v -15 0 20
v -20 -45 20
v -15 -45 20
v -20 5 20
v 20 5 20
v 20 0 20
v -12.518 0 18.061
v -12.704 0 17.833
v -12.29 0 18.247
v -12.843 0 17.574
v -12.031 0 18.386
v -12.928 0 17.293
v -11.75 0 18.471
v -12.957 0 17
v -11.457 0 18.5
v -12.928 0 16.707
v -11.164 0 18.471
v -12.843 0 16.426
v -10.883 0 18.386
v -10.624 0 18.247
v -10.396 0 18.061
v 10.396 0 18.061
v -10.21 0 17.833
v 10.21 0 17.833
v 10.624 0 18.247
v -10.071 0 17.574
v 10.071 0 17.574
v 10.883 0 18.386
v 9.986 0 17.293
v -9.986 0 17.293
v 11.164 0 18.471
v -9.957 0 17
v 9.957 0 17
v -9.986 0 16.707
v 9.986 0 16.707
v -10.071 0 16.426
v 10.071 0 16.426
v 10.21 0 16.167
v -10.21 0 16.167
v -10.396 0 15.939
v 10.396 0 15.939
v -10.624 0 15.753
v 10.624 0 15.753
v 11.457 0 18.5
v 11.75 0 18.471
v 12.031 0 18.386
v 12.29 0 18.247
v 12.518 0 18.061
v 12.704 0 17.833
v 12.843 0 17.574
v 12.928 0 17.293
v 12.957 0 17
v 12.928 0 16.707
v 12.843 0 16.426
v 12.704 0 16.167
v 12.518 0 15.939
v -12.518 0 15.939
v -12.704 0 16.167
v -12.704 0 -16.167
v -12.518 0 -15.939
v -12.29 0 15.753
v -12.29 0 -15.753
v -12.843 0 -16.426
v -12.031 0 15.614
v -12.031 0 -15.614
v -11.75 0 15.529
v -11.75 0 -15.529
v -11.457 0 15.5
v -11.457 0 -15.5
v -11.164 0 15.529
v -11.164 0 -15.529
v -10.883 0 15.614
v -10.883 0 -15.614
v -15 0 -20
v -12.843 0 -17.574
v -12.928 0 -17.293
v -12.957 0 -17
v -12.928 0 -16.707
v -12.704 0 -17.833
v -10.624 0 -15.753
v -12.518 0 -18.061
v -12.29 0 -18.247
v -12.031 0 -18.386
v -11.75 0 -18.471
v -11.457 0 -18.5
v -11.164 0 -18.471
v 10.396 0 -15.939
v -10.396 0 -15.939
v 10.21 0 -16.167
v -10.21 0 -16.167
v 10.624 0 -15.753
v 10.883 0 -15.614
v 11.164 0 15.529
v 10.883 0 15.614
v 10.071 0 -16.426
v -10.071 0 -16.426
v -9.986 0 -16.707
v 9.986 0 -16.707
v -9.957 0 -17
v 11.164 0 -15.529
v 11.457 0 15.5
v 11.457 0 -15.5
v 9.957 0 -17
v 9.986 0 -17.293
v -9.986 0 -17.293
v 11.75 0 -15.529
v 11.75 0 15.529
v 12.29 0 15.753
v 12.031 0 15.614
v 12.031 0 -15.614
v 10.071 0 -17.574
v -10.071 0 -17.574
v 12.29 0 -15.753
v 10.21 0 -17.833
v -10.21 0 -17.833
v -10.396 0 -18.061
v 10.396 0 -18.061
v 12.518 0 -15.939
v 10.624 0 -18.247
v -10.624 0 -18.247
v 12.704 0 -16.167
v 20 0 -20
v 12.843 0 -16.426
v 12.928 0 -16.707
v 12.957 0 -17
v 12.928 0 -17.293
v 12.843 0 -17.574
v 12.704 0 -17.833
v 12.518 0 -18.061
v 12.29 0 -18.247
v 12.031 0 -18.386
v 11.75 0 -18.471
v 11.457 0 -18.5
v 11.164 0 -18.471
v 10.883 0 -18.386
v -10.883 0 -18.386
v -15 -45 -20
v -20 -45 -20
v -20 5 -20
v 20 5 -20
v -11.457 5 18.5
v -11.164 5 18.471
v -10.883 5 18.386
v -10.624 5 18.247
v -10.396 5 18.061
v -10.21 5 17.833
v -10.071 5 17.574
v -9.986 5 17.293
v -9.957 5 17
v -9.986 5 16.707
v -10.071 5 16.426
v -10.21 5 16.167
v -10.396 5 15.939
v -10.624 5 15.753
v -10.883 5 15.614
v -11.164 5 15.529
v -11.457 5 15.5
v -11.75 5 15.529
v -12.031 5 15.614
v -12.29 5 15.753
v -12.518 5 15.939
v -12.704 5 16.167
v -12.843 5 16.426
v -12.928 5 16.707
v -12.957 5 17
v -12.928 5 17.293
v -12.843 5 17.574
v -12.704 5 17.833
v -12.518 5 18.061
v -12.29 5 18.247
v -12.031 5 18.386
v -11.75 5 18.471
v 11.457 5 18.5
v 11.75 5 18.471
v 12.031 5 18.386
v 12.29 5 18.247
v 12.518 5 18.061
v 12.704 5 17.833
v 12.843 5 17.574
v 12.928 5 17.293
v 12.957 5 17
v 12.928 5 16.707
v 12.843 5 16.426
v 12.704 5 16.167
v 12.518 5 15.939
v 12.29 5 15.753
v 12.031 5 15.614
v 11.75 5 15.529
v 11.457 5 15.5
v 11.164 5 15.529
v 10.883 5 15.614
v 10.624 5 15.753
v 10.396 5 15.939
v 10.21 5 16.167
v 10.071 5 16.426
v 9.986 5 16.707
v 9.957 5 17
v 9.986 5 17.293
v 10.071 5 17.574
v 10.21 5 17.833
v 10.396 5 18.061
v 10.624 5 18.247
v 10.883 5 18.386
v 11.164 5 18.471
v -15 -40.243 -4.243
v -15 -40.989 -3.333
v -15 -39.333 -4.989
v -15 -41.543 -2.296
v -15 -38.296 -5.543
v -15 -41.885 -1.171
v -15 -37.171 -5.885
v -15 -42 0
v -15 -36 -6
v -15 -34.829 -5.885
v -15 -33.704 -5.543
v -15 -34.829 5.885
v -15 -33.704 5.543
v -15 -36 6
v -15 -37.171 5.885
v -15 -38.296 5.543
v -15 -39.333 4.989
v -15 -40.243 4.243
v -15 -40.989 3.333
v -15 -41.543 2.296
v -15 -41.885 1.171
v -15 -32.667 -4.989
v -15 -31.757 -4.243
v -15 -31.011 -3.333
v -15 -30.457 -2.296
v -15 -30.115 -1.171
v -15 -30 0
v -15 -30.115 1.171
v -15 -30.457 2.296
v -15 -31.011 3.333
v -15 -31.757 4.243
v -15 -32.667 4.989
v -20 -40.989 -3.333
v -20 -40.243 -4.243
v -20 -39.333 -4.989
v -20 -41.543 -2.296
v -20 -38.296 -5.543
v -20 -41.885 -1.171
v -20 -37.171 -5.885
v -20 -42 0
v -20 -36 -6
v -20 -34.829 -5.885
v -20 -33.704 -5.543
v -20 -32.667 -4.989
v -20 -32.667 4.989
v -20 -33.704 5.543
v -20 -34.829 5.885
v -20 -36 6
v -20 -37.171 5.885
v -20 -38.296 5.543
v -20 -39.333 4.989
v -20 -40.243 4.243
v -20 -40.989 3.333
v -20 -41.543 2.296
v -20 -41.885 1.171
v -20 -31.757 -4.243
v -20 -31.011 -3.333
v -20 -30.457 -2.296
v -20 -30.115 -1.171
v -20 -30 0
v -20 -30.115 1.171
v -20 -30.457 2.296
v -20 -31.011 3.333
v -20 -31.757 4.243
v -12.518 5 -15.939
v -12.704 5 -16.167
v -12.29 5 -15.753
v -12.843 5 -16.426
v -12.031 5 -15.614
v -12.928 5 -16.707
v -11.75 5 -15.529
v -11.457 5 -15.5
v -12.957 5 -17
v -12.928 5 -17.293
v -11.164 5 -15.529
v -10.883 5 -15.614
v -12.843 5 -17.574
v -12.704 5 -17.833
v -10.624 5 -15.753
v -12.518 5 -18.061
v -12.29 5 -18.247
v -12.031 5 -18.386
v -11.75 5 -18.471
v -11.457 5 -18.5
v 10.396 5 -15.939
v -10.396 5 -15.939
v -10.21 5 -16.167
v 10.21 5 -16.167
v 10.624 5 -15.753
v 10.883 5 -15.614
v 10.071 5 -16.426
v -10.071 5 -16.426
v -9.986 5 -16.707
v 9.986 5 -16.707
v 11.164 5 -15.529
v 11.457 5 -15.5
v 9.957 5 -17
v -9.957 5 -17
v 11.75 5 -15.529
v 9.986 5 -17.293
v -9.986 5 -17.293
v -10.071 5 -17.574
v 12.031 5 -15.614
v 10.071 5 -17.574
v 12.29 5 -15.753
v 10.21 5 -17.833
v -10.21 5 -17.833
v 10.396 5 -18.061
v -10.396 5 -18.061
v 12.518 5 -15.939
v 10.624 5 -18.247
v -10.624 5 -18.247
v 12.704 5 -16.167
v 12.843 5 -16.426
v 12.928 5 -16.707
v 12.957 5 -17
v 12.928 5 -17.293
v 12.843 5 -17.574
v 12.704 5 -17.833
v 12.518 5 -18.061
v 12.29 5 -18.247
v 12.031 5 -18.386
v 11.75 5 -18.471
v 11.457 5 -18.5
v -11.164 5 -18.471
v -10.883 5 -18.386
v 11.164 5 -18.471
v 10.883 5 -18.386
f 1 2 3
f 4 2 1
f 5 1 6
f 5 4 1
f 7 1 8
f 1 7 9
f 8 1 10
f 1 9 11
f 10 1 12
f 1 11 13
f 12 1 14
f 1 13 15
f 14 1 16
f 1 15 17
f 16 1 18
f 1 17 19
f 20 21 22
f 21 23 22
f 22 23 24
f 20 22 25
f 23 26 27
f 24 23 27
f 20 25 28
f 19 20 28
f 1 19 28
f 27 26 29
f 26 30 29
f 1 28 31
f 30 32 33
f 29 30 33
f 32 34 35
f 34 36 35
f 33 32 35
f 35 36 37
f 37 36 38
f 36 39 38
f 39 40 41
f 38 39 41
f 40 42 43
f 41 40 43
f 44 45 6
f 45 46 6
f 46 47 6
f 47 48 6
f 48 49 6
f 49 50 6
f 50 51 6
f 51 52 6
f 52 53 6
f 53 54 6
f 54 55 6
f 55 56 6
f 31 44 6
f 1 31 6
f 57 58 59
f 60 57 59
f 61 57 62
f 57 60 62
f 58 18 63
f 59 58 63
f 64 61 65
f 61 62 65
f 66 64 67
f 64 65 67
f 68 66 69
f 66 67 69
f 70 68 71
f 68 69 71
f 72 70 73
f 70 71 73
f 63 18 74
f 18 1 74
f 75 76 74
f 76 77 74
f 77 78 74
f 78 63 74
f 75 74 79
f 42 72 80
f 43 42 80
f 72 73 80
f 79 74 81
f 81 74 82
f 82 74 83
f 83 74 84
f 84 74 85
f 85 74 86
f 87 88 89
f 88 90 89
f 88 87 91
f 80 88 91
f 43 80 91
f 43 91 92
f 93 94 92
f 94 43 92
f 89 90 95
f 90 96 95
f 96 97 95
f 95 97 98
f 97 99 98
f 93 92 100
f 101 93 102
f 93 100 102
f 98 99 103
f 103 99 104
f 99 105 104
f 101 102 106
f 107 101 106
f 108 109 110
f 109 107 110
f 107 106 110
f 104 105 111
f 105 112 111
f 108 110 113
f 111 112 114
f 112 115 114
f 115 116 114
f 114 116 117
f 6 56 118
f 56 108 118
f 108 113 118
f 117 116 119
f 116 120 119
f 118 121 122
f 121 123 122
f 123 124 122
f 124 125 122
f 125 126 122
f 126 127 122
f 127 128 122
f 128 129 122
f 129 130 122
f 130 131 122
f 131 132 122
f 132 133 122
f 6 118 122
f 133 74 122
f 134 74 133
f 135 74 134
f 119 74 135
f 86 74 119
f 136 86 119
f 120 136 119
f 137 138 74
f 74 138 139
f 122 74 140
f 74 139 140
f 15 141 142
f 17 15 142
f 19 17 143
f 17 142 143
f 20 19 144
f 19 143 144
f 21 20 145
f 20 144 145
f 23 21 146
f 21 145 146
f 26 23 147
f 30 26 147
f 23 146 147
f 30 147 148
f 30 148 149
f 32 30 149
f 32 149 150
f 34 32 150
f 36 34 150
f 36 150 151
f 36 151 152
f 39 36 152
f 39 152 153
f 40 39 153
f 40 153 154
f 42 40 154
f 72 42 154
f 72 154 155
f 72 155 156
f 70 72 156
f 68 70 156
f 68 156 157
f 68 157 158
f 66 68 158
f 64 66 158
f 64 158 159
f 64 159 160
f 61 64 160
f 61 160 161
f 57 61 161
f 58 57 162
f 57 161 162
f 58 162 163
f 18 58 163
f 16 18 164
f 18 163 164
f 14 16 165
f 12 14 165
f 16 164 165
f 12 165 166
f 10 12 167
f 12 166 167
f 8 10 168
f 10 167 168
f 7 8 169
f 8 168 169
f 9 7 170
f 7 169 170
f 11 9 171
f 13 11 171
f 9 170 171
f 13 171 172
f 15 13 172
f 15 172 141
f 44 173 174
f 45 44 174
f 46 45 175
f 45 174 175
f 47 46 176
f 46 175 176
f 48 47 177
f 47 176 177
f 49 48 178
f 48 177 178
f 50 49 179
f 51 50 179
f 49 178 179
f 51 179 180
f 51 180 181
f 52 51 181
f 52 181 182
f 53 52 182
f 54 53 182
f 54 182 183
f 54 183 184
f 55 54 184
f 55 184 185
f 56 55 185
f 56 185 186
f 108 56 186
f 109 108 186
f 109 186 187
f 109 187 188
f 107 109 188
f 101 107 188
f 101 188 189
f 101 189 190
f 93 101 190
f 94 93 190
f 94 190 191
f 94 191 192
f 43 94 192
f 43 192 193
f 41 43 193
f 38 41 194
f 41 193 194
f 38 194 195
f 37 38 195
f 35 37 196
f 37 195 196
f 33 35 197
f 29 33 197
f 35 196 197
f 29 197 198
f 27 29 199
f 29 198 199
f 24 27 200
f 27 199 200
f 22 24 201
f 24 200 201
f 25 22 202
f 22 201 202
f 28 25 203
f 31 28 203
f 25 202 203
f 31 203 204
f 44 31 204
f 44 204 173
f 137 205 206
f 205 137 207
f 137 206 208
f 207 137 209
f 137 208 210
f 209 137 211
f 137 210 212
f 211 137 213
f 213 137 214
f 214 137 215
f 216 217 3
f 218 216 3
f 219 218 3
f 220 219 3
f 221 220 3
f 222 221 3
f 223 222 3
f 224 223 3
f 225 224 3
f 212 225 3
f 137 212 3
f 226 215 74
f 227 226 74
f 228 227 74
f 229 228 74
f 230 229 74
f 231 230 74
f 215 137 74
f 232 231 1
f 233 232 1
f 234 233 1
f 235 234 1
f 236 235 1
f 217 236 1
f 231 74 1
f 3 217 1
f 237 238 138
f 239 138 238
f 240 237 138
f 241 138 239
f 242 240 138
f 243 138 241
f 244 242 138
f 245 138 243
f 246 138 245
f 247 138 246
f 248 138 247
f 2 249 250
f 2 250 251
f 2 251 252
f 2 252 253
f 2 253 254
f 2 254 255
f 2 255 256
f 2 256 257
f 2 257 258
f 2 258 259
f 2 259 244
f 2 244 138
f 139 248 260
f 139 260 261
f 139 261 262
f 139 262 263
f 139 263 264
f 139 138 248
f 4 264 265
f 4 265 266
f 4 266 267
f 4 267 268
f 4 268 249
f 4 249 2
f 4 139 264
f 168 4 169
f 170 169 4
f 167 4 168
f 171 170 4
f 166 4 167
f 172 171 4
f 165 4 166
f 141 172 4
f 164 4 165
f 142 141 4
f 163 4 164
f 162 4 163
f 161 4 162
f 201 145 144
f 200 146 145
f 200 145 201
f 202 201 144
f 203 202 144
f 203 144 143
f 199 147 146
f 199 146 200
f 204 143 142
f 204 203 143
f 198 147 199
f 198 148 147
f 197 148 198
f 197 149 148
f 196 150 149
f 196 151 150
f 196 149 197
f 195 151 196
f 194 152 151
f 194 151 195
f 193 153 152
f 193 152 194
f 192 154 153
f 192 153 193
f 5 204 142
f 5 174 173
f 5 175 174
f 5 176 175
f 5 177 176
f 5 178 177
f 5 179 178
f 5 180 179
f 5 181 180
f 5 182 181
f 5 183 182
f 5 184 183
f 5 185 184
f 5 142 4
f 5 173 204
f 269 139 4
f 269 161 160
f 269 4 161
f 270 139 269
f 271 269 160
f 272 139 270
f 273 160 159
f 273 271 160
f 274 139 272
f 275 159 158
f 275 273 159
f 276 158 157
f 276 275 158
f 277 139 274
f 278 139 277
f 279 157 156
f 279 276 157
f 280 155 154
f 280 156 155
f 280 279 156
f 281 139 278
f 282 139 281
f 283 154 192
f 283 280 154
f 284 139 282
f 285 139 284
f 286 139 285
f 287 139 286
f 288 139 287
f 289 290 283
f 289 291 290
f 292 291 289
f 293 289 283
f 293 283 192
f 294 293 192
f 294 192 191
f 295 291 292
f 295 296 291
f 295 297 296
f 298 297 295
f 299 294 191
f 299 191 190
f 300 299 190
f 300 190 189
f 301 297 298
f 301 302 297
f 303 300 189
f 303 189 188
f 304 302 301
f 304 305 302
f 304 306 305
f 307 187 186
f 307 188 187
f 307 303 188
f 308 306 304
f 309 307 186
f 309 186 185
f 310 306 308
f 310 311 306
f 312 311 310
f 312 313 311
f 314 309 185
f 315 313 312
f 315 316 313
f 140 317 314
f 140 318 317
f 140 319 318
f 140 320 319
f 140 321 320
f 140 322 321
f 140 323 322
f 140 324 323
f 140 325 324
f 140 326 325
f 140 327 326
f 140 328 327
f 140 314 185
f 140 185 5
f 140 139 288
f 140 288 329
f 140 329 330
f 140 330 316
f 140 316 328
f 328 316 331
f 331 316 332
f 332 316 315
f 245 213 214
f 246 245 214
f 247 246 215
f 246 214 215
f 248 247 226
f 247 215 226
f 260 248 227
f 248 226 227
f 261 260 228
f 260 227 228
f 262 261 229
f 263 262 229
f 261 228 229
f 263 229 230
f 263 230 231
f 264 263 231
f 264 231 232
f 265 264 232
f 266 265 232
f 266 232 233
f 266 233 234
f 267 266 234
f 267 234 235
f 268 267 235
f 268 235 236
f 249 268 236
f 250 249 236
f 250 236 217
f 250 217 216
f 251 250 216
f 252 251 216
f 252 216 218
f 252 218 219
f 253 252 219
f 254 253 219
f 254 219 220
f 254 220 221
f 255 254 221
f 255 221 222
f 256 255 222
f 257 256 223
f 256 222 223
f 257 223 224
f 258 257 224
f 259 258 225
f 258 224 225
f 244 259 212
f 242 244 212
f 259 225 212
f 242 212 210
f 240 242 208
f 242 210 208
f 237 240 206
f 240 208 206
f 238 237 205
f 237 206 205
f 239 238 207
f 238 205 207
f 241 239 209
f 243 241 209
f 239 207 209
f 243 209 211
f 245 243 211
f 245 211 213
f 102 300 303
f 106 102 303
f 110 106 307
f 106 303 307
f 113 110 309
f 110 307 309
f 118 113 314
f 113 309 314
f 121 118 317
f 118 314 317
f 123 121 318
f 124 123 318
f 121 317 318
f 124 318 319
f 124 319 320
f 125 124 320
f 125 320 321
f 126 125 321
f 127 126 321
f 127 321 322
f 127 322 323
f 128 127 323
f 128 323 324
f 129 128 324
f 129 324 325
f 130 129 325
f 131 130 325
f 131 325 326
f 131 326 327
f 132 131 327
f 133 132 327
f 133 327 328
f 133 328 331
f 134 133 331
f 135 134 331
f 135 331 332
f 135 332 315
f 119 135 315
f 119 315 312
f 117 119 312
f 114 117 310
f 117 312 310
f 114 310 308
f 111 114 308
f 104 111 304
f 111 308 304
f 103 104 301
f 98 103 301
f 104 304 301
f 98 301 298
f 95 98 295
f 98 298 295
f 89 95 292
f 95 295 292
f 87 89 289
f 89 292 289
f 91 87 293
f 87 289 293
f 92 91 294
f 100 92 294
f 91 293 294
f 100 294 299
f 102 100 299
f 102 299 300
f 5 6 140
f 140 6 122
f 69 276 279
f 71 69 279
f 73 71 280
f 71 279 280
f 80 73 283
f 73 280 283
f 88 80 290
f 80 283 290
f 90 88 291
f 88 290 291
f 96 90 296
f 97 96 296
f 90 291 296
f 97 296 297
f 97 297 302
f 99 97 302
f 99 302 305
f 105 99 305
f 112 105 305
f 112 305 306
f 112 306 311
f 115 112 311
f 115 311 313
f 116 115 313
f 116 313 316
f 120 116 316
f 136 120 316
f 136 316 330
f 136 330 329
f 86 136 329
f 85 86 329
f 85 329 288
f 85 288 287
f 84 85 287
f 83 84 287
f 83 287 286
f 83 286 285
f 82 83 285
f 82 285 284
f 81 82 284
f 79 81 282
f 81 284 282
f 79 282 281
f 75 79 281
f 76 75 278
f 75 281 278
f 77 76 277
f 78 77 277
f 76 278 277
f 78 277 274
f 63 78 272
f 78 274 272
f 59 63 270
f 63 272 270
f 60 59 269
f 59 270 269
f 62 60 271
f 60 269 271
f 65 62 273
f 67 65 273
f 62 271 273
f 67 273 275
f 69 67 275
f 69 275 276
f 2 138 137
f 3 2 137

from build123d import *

# Parameters (mm, degrees)
SKETCH1_W           = 40
SKETCH1_H           = 40
BOSS_EXTRUDE1_DEPTH = 5
SKETCH2_W           = 5
SKETCH2_H           = 40
BOSS_EXTRUDE4_DEPTH = 45
SKETCH6_R           = 6
CUT_EXTRUDE5_DEPTH  = 61.415229868
SKETCH7_R           = 1.5
CUT_EXTRUDE6_DEPTH  = 58.445626465


with BuildPart() as part:
    # Sketch1 → Boss-Extrude1 (new body)
    with BuildSketch(Plane(origin=(0, 0, 0), x_dir=(1, 0, 0), z_dir=(0, 1, 0))):
        Rectangle(SKETCH1_W, SKETCH1_H)
    extrude(amount=BOSS_EXTRUDE1_DEPTH)

    # Sketch2 → Boss-Extrude4 (add)
    with BuildSketch(Plane.XZ):
        with Locations((-17.5, 0)):
            Rectangle(SKETCH2_W, SKETCH2_H)
    extrude(amount=BOSS_EXTRUDE4_DEPTH)

    # Sketch6 → Cut-Extrude5 (cut, through all)
    with BuildSketch(Plane(origin=(-15, 0, 0), x_dir=(0, 0, -1), z_dir=(1, 0, 0))):
        with Locations((0, -36)):
            Circle(SKETCH6_R)
    extrude(amount=-CUT_EXTRUDE5_DEPTH, mode=Mode.SUBTRACT)

    # Sketch7 → Cut-Extrude6 (cut, through all)
    with BuildSketch(Plane(origin=(0, 5, 0), x_dir=(1, 0, 0), z_dir=(0, 1, 0))):
        with Locations(Location((-11.456996051, 17, 0), (0, 0, 270))):
            Circle(SKETCH7_R)
        with Locations(Location((11.456996051, 17, 0), (0, 0, 270))):
            Circle(SKETCH7_R)
        with Locations(Location((11.456996051, -17, 0), (0, 0, 270))):
            Circle(SKETCH7_R)
        with Locations(Location((-11.456996051, -17, 0), (0, 0, 270))):
            Circle(SKETCH7_R)
    extrude(amount=-CUT_EXTRUDE6_DEPTH, mode=Mode.SUBTRACT)


solid = part.part
